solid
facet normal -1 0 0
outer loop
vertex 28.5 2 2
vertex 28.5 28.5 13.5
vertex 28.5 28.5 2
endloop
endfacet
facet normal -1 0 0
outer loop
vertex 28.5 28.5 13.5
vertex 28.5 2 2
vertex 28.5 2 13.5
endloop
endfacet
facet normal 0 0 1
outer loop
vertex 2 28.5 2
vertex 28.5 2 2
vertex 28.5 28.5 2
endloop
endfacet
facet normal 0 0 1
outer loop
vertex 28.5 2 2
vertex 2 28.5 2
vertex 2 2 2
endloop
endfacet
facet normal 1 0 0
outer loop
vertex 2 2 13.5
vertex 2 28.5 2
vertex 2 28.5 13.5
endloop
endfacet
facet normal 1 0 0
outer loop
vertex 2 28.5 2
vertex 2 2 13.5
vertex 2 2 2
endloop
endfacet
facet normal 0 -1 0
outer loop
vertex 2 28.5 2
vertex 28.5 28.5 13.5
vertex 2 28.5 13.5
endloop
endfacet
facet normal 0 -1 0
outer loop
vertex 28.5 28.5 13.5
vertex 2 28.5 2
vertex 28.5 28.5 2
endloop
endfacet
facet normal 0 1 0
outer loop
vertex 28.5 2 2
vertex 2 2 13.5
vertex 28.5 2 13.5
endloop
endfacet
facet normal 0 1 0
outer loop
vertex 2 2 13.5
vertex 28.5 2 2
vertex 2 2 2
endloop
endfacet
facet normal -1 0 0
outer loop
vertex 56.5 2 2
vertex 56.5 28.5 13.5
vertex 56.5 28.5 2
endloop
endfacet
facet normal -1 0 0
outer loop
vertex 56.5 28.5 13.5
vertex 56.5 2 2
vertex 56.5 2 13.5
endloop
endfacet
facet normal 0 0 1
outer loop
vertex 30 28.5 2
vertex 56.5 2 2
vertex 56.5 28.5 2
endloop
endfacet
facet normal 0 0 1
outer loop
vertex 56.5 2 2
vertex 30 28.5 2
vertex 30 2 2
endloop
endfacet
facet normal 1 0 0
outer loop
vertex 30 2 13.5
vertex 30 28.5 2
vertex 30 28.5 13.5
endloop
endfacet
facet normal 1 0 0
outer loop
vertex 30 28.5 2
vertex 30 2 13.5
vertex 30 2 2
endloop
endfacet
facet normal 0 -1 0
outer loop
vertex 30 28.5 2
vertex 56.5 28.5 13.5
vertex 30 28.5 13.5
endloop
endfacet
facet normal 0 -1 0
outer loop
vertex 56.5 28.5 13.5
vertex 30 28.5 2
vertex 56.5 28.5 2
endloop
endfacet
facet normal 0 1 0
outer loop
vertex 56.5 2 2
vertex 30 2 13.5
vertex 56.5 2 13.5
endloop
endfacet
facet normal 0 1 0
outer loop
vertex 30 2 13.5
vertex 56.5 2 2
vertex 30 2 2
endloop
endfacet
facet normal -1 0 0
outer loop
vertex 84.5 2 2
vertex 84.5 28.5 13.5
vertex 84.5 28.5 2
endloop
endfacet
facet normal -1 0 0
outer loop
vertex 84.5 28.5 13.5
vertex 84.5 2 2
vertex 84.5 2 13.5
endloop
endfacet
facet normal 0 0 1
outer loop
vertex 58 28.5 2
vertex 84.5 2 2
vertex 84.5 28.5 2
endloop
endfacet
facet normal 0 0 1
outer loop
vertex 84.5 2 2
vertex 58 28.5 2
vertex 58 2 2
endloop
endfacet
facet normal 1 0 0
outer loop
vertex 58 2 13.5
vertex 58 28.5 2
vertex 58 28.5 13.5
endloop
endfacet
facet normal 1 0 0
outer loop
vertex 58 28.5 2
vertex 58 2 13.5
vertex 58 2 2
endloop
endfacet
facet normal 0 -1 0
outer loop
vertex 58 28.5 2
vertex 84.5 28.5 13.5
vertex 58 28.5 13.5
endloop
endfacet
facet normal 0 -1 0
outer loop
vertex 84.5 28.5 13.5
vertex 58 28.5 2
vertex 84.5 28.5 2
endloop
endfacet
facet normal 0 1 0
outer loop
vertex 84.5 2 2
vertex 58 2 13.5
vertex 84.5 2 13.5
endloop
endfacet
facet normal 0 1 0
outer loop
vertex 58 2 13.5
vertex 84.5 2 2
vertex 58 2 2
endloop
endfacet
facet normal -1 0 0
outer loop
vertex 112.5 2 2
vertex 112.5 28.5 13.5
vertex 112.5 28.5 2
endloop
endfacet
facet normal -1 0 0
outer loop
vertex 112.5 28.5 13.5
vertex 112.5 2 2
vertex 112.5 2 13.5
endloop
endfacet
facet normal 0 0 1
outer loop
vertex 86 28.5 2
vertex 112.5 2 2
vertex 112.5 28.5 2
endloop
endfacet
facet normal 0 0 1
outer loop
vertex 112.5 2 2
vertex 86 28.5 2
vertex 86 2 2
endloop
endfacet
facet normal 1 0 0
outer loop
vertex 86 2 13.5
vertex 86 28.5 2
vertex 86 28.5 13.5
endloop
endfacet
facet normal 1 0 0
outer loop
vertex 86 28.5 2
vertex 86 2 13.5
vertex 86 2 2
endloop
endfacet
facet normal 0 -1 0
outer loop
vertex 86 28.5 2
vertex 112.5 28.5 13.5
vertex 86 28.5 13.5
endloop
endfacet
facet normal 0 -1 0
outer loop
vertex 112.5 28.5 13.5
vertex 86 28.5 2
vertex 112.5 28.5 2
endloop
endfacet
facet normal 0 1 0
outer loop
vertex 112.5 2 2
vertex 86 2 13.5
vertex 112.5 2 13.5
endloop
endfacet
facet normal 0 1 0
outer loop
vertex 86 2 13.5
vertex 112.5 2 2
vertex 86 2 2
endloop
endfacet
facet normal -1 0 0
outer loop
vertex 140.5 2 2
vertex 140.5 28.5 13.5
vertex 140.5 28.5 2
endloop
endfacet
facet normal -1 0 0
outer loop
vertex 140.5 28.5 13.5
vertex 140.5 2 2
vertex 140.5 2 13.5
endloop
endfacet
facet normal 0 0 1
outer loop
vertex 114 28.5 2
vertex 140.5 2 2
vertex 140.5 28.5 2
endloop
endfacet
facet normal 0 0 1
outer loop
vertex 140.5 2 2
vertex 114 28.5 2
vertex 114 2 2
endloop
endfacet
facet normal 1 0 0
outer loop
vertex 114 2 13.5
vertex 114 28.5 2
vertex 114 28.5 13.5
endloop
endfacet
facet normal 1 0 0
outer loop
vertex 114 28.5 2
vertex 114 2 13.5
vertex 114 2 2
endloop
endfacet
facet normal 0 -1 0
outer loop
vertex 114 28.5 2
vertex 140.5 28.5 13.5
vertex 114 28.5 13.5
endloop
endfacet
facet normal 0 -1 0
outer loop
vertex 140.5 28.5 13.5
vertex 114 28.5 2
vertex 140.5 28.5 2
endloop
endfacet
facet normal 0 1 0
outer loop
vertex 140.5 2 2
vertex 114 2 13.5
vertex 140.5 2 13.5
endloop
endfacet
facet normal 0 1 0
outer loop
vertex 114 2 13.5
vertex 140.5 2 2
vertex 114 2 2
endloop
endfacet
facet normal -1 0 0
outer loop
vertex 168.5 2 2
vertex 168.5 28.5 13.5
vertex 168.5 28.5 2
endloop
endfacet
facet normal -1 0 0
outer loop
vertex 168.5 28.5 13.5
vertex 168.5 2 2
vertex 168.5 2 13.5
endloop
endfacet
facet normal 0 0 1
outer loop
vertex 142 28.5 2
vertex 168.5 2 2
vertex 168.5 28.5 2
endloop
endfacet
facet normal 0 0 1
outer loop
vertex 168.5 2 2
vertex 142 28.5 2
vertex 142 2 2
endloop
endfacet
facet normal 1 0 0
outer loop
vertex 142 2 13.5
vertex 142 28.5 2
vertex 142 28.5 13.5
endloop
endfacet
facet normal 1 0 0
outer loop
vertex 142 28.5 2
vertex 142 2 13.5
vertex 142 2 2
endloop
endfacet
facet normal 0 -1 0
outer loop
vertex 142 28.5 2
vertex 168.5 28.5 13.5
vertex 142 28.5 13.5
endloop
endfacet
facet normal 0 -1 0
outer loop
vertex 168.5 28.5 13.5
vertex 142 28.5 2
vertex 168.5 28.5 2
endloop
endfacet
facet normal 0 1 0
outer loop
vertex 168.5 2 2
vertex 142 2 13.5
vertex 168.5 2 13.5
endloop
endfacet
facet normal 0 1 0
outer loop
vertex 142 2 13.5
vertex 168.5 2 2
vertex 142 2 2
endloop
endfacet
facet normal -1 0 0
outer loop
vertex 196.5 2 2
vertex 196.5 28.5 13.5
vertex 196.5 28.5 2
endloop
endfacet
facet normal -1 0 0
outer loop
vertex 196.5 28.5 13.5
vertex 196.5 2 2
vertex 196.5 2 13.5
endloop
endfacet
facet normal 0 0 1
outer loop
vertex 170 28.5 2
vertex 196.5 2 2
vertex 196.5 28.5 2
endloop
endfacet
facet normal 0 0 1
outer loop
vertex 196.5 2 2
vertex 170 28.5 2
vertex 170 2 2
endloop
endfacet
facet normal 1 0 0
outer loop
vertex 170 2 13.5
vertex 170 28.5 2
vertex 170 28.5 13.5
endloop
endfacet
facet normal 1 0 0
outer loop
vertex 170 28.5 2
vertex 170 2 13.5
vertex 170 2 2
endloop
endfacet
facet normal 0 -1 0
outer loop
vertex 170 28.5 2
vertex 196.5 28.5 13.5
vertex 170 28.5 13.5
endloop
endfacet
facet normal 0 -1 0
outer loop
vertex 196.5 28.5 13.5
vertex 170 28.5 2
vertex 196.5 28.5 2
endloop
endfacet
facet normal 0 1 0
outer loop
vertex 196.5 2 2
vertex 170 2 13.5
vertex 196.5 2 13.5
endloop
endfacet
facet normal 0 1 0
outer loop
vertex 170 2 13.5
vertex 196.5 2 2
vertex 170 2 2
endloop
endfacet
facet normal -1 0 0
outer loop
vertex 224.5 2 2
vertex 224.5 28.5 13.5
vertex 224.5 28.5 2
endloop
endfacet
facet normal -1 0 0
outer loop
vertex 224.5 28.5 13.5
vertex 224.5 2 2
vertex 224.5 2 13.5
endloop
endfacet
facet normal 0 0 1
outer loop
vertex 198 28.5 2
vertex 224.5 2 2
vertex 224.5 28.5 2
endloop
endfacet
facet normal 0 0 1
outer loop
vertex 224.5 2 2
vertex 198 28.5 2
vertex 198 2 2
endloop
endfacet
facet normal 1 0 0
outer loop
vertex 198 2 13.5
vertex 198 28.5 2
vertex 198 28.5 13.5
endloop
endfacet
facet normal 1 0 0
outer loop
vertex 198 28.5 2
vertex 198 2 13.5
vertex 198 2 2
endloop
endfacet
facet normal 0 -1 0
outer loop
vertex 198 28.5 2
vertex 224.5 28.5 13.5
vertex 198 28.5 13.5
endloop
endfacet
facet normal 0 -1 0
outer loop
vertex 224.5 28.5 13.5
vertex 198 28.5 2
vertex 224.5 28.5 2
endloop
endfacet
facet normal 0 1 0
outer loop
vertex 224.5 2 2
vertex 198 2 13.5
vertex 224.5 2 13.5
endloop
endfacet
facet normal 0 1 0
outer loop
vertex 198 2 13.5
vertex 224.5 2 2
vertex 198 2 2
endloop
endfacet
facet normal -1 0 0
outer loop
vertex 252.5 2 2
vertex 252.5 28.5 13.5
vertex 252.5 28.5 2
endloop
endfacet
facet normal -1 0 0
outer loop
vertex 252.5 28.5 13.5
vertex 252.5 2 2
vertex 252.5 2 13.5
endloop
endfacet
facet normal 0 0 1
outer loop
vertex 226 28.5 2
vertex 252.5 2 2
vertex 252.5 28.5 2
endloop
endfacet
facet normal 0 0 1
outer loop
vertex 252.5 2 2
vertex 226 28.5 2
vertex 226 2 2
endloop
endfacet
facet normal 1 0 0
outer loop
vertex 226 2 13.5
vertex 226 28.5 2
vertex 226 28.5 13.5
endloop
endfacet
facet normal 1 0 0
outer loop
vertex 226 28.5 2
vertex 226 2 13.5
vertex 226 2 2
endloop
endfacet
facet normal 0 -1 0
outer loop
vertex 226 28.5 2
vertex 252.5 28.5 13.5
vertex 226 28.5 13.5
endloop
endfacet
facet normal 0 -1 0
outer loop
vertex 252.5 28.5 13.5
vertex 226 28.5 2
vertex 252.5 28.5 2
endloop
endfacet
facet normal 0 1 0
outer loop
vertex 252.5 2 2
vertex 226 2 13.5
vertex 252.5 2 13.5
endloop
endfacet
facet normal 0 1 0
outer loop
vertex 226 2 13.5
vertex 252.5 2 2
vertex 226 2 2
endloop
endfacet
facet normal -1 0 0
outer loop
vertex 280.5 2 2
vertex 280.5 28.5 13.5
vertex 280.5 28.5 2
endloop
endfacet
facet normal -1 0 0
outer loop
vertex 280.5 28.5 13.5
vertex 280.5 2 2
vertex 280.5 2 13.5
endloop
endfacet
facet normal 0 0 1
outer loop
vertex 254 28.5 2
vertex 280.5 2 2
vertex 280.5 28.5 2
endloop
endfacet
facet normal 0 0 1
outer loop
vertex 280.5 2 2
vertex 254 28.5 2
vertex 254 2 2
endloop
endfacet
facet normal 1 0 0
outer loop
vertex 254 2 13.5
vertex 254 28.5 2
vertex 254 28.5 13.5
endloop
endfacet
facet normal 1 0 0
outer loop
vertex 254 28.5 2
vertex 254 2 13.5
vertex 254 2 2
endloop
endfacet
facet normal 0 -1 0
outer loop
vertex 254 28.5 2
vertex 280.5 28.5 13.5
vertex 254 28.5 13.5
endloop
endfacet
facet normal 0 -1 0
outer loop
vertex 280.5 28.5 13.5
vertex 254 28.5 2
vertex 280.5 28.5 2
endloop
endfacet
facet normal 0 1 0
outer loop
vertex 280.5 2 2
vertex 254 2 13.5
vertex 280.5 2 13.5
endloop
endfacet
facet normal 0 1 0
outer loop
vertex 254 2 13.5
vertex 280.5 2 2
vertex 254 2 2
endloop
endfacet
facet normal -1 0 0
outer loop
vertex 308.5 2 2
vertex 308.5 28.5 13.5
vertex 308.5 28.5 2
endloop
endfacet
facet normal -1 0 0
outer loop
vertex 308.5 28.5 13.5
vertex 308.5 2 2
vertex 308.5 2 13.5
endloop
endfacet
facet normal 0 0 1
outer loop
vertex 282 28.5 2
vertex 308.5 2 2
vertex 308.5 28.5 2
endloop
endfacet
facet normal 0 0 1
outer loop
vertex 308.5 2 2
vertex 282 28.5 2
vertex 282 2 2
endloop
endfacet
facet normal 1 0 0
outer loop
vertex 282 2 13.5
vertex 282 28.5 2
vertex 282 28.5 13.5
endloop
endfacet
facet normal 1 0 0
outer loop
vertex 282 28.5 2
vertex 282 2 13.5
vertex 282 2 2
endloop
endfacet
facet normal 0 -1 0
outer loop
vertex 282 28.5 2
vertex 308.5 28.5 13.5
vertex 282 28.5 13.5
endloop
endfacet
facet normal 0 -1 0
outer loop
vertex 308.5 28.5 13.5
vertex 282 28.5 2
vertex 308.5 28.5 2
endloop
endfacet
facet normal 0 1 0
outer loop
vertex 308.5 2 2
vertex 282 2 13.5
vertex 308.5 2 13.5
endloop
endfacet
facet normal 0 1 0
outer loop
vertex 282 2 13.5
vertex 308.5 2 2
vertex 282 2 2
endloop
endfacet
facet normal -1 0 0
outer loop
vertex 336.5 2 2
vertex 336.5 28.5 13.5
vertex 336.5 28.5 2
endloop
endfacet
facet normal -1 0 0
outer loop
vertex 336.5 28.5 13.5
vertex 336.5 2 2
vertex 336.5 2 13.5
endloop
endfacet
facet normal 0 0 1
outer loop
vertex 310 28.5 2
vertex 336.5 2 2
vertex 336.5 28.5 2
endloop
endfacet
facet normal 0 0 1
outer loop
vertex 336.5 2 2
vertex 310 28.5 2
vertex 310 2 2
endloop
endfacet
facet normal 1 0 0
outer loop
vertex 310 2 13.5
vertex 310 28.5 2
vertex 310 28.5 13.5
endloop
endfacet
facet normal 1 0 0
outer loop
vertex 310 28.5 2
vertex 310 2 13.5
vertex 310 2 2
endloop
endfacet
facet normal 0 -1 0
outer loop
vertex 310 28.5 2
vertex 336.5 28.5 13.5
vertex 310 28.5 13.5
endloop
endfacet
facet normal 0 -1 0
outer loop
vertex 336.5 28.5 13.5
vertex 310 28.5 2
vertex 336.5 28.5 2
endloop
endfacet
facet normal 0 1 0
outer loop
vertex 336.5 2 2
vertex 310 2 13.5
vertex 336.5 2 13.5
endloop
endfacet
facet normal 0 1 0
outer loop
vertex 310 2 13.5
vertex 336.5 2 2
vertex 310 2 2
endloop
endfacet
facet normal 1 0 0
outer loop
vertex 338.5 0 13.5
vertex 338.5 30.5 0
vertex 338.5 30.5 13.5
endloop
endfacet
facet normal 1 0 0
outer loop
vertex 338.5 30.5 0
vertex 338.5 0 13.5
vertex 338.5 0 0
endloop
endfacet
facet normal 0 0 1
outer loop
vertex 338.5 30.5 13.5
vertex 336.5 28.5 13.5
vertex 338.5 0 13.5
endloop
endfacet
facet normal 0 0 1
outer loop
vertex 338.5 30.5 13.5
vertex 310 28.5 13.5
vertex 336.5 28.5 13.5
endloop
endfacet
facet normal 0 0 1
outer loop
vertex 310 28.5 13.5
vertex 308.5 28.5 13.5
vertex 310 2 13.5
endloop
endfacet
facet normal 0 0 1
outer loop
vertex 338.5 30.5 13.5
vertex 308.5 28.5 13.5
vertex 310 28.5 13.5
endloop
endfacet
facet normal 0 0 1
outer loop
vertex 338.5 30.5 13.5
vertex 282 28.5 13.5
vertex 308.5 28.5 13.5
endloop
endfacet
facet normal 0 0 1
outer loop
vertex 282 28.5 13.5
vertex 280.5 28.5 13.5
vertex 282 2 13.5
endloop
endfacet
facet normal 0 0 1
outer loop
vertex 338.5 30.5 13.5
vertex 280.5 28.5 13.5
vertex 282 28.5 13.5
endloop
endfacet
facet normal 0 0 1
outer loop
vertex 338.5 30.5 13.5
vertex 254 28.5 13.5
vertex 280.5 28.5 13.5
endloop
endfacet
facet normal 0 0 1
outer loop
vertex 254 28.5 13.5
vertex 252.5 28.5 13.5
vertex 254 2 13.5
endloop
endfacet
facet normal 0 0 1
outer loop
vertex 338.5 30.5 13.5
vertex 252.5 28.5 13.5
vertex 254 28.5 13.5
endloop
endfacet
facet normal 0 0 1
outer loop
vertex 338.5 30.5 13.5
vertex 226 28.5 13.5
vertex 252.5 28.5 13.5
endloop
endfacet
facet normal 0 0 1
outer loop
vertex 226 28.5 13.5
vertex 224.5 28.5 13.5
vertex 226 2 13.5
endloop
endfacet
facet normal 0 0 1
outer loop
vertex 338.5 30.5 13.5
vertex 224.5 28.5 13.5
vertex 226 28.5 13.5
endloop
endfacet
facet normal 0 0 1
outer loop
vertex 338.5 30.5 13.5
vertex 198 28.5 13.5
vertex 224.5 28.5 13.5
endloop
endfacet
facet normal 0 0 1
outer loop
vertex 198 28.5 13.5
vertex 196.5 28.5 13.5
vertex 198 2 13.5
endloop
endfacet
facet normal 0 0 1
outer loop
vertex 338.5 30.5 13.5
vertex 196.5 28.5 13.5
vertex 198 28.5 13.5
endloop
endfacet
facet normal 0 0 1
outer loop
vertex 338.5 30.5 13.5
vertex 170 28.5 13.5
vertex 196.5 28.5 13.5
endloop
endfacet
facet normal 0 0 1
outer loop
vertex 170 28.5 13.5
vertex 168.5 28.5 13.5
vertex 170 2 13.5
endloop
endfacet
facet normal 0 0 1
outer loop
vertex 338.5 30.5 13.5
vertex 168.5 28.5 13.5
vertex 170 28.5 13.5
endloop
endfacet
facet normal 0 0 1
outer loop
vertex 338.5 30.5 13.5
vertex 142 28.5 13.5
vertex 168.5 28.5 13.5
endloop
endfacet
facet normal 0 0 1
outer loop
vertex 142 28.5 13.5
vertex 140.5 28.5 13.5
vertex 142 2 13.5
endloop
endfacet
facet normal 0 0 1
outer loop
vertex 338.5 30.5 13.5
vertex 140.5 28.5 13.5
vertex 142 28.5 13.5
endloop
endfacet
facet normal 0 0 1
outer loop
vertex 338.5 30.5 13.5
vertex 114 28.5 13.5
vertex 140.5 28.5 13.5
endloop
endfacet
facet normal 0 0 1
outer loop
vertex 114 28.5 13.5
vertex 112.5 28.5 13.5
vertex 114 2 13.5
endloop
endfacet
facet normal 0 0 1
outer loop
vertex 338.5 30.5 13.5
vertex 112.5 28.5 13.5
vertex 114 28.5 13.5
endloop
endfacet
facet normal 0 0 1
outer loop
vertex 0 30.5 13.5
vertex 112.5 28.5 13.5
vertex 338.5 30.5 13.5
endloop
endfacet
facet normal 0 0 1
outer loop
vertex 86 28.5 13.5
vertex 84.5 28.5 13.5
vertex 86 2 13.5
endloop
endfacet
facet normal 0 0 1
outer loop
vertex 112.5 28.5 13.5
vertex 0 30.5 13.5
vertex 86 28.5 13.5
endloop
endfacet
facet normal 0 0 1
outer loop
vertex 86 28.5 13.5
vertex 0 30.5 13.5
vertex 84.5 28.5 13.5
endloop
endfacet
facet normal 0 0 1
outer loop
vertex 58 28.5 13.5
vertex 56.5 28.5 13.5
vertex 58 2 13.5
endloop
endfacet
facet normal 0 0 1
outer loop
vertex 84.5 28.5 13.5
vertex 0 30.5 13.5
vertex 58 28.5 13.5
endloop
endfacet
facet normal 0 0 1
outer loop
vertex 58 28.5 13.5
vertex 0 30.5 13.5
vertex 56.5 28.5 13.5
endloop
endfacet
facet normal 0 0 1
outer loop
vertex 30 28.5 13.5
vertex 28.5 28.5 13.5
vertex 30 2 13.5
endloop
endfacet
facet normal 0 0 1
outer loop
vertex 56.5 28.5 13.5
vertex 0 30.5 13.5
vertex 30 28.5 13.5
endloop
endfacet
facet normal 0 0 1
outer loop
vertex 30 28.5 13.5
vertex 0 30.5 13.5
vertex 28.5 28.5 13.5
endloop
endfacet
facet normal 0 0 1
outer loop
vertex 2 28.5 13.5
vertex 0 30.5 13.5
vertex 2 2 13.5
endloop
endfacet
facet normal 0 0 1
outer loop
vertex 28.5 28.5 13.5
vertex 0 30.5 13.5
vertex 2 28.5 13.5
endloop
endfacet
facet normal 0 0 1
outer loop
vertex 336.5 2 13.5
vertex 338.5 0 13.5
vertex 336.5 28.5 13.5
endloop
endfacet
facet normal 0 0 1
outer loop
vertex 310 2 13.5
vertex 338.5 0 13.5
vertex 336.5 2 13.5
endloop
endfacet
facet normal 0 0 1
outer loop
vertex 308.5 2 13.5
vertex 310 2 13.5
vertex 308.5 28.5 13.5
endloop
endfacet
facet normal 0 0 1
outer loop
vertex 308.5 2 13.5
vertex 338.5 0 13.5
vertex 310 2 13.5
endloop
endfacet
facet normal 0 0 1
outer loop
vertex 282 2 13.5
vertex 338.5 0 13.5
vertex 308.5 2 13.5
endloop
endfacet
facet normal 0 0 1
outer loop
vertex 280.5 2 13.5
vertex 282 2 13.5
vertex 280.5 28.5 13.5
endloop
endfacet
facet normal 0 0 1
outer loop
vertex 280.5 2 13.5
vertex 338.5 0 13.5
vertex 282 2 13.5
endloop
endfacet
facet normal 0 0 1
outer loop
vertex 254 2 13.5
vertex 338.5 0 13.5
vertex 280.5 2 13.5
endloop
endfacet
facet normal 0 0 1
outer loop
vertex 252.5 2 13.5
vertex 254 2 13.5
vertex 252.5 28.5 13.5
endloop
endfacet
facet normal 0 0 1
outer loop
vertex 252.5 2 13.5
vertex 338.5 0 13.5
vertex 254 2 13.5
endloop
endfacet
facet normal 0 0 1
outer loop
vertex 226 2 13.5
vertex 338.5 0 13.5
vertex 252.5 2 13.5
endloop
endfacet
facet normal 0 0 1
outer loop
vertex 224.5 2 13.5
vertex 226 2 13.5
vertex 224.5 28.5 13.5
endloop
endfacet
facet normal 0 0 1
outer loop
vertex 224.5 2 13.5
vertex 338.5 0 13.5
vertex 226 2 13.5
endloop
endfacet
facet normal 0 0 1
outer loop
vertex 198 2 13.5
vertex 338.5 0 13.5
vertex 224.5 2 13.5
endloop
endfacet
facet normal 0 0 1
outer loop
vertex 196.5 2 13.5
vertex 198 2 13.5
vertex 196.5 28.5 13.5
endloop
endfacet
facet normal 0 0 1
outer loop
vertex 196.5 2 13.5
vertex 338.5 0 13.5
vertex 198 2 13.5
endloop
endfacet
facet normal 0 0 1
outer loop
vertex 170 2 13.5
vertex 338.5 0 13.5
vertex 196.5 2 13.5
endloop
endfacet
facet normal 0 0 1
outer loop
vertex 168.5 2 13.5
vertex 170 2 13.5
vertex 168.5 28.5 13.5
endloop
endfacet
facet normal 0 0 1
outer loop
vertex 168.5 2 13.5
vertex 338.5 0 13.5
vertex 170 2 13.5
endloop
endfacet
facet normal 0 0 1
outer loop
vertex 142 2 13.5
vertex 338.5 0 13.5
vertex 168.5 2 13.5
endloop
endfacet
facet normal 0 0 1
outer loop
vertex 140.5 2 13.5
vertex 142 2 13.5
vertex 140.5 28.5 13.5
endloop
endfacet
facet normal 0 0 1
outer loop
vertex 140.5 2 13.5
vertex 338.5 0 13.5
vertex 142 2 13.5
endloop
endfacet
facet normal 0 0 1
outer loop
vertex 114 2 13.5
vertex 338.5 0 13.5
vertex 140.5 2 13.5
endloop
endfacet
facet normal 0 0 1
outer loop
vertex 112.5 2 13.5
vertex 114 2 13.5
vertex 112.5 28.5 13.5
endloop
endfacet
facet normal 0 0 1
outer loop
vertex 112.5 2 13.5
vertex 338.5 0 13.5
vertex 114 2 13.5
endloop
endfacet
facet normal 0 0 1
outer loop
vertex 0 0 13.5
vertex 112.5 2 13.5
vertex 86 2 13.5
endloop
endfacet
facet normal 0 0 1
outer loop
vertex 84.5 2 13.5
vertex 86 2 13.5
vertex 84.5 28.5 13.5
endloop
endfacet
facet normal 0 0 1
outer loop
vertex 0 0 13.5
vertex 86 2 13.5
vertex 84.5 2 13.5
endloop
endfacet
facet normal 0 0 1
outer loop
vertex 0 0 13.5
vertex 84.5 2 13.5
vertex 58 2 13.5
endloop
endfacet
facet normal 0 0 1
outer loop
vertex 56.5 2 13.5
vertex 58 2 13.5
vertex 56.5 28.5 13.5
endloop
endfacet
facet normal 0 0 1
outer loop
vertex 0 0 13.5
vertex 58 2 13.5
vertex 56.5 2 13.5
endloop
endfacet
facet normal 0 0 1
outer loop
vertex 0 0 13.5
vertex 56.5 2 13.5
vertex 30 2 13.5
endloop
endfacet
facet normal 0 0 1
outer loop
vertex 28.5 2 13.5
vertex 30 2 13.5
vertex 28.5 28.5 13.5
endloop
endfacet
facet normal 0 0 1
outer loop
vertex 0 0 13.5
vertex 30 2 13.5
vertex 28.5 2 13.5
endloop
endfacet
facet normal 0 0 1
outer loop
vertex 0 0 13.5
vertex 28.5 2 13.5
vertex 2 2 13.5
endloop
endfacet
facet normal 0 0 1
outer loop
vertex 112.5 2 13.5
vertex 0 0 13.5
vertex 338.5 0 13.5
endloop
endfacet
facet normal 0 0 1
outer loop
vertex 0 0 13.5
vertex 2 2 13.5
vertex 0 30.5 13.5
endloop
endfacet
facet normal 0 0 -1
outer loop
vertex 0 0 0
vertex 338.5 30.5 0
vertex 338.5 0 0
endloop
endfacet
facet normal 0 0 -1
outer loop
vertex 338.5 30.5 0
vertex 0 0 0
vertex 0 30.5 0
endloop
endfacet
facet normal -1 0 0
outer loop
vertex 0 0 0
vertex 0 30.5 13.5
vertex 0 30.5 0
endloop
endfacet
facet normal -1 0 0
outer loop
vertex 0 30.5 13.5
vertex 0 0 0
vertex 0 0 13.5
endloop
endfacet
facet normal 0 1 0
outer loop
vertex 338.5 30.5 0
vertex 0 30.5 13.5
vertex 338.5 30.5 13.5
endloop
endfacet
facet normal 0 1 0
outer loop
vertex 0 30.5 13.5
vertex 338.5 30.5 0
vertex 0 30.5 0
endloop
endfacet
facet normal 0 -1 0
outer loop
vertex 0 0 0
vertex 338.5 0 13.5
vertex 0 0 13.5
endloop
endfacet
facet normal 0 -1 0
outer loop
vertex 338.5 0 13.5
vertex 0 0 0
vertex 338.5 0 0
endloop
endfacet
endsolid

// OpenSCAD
// Generated by SolidPython 1.1.3 on 2026-02-21 17:47:57


difference() {
	cube(size = [338.5000000000, 30.5000000000, 13.5000000000]);
	union() {
		translate(v = [2.0000000000, 2.0000000000, 2.0000000000]) {
			cube(size = [26.5000000000, 26.5000000000, 11.5100000000]);
		}
		translate(v = [30.0000000000, 2.0000000000, 2.0000000000]) {
			cube(size = [26.5000000000, 26.5000000000, 11.5100000000]);
		}
		translate(v = [58.0000000000, 2.0000000000, 2.0000000000]) {
			cube(size = [26.5000000000, 26.5000000000, 11.5100000000]);
		}
		translate(v = [86.0000000000, 2.0000000000, 2.0000000000]) {
			cube(size = [26.5000000000, 26.5000000000, 11.5100000000]);
		}
		translate(v = [114.0000000000, 2.0000000000, 2.0000000000]) {
			cube(size = [26.5000000000, 26.5000000000, 11.5100000000]);
		}
		translate(v = [142.0000000000, 2.0000000000, 2.0000000000]) {
			cube(size = [26.5000000000, 26.5000000000, 11.5100000000]);
		}
		translate(v = [170.0000000000, 2.0000000000, 2.0000000000]) {
			cube(size = [26.5000000000, 26.5000000000, 11.5100000000]);
		}
		translate(v = [198.0000000000, 2.0000000000, 2.0000000000]) {
			cube(size = [26.5000000000, 26.5000000000, 11.5100000000]);
		}
		translate(v = [226.0000000000, 2.0000000000, 2.0000000000]) {
			cube(size = [26.5000000000, 26.5000000000, 11.5100000000]);
		}
		translate(v = [254.0000000000, 2.0000000000, 2.0000000000]) {
			cube(size = [26.5000000000, 26.5000000000, 11.5100000000]);
		}
		translate(v = [282.0000000000, 2.0000000000, 2.0000000000]) {
			cube(size = [26.5000000000, 26.5000000000, 11.5100000000]);
		}
		translate(v = [310.0000000000, 2.0000000000, 2.0000000000]) {
			cube(size = [26.5000000000, 26.5000000000, 11.5100000000]);
		}
	}
}
/***********************************************
*********      SolidPython code:      **********
************************************************
 
"""SolidPython geometry building for storage cases."""

from typing import List, Union

from solid import cube, difference, scad_render_to_file, translate, union

from .config import Config
from .layout import GridLayoutResult, MixedLayoutResult, SlotRect


def build_base_tray(
    slots: List[SlotRect],
    total_width: float,
    total_length: float,
    config: Config,
):
    """Build the solid base tray (floor + perimeter walls) with slot cavities subtracted."""
    wall = config.wall_thickness
    base_h = config.base_height
    max_height = max(s.height for s in slots)

    outer_x = total_width + 2 * wall
    outer_y = total_length + 2 * wall
    outer_z = base_h + max_height

    outer_box = cube([outer_x, outer_y, outer_z])

    # Subtract each slot cavity
    cavities = []
    for slot in slots:
        cavity = translate([wall + slot.x, wall + slot.y, base_h])(
            cube([slot.width, slot.length, slot.height + 0.01])  # +epsilon for clean cut
        )
        cavities.append(cavity)

    if cavities:
        tray = difference()(outer_box, union()(*cavities))
    else:
        tray = outer_box

    return tray


def assemble_case(
    layout_result: Union[GridLayoutResult, MixedLayoutResult],
    config: Config,
):
    """Assemble the complete case: base tray with slot cavities (dividers are implicit)."""
    slots = layout_result.slots
    total_width = layout_result.total_width
    total_length = layout_result.total_length

    case = build_base_tray(slots, total_width, total_length, config)
    return case


def render_to_file(assembly, filepath: str) -> None:
    """Render the assembly to an OpenSCAD .scad file."""
    scad_render_to_file(assembly, filepath)
 
 
************************************************/
